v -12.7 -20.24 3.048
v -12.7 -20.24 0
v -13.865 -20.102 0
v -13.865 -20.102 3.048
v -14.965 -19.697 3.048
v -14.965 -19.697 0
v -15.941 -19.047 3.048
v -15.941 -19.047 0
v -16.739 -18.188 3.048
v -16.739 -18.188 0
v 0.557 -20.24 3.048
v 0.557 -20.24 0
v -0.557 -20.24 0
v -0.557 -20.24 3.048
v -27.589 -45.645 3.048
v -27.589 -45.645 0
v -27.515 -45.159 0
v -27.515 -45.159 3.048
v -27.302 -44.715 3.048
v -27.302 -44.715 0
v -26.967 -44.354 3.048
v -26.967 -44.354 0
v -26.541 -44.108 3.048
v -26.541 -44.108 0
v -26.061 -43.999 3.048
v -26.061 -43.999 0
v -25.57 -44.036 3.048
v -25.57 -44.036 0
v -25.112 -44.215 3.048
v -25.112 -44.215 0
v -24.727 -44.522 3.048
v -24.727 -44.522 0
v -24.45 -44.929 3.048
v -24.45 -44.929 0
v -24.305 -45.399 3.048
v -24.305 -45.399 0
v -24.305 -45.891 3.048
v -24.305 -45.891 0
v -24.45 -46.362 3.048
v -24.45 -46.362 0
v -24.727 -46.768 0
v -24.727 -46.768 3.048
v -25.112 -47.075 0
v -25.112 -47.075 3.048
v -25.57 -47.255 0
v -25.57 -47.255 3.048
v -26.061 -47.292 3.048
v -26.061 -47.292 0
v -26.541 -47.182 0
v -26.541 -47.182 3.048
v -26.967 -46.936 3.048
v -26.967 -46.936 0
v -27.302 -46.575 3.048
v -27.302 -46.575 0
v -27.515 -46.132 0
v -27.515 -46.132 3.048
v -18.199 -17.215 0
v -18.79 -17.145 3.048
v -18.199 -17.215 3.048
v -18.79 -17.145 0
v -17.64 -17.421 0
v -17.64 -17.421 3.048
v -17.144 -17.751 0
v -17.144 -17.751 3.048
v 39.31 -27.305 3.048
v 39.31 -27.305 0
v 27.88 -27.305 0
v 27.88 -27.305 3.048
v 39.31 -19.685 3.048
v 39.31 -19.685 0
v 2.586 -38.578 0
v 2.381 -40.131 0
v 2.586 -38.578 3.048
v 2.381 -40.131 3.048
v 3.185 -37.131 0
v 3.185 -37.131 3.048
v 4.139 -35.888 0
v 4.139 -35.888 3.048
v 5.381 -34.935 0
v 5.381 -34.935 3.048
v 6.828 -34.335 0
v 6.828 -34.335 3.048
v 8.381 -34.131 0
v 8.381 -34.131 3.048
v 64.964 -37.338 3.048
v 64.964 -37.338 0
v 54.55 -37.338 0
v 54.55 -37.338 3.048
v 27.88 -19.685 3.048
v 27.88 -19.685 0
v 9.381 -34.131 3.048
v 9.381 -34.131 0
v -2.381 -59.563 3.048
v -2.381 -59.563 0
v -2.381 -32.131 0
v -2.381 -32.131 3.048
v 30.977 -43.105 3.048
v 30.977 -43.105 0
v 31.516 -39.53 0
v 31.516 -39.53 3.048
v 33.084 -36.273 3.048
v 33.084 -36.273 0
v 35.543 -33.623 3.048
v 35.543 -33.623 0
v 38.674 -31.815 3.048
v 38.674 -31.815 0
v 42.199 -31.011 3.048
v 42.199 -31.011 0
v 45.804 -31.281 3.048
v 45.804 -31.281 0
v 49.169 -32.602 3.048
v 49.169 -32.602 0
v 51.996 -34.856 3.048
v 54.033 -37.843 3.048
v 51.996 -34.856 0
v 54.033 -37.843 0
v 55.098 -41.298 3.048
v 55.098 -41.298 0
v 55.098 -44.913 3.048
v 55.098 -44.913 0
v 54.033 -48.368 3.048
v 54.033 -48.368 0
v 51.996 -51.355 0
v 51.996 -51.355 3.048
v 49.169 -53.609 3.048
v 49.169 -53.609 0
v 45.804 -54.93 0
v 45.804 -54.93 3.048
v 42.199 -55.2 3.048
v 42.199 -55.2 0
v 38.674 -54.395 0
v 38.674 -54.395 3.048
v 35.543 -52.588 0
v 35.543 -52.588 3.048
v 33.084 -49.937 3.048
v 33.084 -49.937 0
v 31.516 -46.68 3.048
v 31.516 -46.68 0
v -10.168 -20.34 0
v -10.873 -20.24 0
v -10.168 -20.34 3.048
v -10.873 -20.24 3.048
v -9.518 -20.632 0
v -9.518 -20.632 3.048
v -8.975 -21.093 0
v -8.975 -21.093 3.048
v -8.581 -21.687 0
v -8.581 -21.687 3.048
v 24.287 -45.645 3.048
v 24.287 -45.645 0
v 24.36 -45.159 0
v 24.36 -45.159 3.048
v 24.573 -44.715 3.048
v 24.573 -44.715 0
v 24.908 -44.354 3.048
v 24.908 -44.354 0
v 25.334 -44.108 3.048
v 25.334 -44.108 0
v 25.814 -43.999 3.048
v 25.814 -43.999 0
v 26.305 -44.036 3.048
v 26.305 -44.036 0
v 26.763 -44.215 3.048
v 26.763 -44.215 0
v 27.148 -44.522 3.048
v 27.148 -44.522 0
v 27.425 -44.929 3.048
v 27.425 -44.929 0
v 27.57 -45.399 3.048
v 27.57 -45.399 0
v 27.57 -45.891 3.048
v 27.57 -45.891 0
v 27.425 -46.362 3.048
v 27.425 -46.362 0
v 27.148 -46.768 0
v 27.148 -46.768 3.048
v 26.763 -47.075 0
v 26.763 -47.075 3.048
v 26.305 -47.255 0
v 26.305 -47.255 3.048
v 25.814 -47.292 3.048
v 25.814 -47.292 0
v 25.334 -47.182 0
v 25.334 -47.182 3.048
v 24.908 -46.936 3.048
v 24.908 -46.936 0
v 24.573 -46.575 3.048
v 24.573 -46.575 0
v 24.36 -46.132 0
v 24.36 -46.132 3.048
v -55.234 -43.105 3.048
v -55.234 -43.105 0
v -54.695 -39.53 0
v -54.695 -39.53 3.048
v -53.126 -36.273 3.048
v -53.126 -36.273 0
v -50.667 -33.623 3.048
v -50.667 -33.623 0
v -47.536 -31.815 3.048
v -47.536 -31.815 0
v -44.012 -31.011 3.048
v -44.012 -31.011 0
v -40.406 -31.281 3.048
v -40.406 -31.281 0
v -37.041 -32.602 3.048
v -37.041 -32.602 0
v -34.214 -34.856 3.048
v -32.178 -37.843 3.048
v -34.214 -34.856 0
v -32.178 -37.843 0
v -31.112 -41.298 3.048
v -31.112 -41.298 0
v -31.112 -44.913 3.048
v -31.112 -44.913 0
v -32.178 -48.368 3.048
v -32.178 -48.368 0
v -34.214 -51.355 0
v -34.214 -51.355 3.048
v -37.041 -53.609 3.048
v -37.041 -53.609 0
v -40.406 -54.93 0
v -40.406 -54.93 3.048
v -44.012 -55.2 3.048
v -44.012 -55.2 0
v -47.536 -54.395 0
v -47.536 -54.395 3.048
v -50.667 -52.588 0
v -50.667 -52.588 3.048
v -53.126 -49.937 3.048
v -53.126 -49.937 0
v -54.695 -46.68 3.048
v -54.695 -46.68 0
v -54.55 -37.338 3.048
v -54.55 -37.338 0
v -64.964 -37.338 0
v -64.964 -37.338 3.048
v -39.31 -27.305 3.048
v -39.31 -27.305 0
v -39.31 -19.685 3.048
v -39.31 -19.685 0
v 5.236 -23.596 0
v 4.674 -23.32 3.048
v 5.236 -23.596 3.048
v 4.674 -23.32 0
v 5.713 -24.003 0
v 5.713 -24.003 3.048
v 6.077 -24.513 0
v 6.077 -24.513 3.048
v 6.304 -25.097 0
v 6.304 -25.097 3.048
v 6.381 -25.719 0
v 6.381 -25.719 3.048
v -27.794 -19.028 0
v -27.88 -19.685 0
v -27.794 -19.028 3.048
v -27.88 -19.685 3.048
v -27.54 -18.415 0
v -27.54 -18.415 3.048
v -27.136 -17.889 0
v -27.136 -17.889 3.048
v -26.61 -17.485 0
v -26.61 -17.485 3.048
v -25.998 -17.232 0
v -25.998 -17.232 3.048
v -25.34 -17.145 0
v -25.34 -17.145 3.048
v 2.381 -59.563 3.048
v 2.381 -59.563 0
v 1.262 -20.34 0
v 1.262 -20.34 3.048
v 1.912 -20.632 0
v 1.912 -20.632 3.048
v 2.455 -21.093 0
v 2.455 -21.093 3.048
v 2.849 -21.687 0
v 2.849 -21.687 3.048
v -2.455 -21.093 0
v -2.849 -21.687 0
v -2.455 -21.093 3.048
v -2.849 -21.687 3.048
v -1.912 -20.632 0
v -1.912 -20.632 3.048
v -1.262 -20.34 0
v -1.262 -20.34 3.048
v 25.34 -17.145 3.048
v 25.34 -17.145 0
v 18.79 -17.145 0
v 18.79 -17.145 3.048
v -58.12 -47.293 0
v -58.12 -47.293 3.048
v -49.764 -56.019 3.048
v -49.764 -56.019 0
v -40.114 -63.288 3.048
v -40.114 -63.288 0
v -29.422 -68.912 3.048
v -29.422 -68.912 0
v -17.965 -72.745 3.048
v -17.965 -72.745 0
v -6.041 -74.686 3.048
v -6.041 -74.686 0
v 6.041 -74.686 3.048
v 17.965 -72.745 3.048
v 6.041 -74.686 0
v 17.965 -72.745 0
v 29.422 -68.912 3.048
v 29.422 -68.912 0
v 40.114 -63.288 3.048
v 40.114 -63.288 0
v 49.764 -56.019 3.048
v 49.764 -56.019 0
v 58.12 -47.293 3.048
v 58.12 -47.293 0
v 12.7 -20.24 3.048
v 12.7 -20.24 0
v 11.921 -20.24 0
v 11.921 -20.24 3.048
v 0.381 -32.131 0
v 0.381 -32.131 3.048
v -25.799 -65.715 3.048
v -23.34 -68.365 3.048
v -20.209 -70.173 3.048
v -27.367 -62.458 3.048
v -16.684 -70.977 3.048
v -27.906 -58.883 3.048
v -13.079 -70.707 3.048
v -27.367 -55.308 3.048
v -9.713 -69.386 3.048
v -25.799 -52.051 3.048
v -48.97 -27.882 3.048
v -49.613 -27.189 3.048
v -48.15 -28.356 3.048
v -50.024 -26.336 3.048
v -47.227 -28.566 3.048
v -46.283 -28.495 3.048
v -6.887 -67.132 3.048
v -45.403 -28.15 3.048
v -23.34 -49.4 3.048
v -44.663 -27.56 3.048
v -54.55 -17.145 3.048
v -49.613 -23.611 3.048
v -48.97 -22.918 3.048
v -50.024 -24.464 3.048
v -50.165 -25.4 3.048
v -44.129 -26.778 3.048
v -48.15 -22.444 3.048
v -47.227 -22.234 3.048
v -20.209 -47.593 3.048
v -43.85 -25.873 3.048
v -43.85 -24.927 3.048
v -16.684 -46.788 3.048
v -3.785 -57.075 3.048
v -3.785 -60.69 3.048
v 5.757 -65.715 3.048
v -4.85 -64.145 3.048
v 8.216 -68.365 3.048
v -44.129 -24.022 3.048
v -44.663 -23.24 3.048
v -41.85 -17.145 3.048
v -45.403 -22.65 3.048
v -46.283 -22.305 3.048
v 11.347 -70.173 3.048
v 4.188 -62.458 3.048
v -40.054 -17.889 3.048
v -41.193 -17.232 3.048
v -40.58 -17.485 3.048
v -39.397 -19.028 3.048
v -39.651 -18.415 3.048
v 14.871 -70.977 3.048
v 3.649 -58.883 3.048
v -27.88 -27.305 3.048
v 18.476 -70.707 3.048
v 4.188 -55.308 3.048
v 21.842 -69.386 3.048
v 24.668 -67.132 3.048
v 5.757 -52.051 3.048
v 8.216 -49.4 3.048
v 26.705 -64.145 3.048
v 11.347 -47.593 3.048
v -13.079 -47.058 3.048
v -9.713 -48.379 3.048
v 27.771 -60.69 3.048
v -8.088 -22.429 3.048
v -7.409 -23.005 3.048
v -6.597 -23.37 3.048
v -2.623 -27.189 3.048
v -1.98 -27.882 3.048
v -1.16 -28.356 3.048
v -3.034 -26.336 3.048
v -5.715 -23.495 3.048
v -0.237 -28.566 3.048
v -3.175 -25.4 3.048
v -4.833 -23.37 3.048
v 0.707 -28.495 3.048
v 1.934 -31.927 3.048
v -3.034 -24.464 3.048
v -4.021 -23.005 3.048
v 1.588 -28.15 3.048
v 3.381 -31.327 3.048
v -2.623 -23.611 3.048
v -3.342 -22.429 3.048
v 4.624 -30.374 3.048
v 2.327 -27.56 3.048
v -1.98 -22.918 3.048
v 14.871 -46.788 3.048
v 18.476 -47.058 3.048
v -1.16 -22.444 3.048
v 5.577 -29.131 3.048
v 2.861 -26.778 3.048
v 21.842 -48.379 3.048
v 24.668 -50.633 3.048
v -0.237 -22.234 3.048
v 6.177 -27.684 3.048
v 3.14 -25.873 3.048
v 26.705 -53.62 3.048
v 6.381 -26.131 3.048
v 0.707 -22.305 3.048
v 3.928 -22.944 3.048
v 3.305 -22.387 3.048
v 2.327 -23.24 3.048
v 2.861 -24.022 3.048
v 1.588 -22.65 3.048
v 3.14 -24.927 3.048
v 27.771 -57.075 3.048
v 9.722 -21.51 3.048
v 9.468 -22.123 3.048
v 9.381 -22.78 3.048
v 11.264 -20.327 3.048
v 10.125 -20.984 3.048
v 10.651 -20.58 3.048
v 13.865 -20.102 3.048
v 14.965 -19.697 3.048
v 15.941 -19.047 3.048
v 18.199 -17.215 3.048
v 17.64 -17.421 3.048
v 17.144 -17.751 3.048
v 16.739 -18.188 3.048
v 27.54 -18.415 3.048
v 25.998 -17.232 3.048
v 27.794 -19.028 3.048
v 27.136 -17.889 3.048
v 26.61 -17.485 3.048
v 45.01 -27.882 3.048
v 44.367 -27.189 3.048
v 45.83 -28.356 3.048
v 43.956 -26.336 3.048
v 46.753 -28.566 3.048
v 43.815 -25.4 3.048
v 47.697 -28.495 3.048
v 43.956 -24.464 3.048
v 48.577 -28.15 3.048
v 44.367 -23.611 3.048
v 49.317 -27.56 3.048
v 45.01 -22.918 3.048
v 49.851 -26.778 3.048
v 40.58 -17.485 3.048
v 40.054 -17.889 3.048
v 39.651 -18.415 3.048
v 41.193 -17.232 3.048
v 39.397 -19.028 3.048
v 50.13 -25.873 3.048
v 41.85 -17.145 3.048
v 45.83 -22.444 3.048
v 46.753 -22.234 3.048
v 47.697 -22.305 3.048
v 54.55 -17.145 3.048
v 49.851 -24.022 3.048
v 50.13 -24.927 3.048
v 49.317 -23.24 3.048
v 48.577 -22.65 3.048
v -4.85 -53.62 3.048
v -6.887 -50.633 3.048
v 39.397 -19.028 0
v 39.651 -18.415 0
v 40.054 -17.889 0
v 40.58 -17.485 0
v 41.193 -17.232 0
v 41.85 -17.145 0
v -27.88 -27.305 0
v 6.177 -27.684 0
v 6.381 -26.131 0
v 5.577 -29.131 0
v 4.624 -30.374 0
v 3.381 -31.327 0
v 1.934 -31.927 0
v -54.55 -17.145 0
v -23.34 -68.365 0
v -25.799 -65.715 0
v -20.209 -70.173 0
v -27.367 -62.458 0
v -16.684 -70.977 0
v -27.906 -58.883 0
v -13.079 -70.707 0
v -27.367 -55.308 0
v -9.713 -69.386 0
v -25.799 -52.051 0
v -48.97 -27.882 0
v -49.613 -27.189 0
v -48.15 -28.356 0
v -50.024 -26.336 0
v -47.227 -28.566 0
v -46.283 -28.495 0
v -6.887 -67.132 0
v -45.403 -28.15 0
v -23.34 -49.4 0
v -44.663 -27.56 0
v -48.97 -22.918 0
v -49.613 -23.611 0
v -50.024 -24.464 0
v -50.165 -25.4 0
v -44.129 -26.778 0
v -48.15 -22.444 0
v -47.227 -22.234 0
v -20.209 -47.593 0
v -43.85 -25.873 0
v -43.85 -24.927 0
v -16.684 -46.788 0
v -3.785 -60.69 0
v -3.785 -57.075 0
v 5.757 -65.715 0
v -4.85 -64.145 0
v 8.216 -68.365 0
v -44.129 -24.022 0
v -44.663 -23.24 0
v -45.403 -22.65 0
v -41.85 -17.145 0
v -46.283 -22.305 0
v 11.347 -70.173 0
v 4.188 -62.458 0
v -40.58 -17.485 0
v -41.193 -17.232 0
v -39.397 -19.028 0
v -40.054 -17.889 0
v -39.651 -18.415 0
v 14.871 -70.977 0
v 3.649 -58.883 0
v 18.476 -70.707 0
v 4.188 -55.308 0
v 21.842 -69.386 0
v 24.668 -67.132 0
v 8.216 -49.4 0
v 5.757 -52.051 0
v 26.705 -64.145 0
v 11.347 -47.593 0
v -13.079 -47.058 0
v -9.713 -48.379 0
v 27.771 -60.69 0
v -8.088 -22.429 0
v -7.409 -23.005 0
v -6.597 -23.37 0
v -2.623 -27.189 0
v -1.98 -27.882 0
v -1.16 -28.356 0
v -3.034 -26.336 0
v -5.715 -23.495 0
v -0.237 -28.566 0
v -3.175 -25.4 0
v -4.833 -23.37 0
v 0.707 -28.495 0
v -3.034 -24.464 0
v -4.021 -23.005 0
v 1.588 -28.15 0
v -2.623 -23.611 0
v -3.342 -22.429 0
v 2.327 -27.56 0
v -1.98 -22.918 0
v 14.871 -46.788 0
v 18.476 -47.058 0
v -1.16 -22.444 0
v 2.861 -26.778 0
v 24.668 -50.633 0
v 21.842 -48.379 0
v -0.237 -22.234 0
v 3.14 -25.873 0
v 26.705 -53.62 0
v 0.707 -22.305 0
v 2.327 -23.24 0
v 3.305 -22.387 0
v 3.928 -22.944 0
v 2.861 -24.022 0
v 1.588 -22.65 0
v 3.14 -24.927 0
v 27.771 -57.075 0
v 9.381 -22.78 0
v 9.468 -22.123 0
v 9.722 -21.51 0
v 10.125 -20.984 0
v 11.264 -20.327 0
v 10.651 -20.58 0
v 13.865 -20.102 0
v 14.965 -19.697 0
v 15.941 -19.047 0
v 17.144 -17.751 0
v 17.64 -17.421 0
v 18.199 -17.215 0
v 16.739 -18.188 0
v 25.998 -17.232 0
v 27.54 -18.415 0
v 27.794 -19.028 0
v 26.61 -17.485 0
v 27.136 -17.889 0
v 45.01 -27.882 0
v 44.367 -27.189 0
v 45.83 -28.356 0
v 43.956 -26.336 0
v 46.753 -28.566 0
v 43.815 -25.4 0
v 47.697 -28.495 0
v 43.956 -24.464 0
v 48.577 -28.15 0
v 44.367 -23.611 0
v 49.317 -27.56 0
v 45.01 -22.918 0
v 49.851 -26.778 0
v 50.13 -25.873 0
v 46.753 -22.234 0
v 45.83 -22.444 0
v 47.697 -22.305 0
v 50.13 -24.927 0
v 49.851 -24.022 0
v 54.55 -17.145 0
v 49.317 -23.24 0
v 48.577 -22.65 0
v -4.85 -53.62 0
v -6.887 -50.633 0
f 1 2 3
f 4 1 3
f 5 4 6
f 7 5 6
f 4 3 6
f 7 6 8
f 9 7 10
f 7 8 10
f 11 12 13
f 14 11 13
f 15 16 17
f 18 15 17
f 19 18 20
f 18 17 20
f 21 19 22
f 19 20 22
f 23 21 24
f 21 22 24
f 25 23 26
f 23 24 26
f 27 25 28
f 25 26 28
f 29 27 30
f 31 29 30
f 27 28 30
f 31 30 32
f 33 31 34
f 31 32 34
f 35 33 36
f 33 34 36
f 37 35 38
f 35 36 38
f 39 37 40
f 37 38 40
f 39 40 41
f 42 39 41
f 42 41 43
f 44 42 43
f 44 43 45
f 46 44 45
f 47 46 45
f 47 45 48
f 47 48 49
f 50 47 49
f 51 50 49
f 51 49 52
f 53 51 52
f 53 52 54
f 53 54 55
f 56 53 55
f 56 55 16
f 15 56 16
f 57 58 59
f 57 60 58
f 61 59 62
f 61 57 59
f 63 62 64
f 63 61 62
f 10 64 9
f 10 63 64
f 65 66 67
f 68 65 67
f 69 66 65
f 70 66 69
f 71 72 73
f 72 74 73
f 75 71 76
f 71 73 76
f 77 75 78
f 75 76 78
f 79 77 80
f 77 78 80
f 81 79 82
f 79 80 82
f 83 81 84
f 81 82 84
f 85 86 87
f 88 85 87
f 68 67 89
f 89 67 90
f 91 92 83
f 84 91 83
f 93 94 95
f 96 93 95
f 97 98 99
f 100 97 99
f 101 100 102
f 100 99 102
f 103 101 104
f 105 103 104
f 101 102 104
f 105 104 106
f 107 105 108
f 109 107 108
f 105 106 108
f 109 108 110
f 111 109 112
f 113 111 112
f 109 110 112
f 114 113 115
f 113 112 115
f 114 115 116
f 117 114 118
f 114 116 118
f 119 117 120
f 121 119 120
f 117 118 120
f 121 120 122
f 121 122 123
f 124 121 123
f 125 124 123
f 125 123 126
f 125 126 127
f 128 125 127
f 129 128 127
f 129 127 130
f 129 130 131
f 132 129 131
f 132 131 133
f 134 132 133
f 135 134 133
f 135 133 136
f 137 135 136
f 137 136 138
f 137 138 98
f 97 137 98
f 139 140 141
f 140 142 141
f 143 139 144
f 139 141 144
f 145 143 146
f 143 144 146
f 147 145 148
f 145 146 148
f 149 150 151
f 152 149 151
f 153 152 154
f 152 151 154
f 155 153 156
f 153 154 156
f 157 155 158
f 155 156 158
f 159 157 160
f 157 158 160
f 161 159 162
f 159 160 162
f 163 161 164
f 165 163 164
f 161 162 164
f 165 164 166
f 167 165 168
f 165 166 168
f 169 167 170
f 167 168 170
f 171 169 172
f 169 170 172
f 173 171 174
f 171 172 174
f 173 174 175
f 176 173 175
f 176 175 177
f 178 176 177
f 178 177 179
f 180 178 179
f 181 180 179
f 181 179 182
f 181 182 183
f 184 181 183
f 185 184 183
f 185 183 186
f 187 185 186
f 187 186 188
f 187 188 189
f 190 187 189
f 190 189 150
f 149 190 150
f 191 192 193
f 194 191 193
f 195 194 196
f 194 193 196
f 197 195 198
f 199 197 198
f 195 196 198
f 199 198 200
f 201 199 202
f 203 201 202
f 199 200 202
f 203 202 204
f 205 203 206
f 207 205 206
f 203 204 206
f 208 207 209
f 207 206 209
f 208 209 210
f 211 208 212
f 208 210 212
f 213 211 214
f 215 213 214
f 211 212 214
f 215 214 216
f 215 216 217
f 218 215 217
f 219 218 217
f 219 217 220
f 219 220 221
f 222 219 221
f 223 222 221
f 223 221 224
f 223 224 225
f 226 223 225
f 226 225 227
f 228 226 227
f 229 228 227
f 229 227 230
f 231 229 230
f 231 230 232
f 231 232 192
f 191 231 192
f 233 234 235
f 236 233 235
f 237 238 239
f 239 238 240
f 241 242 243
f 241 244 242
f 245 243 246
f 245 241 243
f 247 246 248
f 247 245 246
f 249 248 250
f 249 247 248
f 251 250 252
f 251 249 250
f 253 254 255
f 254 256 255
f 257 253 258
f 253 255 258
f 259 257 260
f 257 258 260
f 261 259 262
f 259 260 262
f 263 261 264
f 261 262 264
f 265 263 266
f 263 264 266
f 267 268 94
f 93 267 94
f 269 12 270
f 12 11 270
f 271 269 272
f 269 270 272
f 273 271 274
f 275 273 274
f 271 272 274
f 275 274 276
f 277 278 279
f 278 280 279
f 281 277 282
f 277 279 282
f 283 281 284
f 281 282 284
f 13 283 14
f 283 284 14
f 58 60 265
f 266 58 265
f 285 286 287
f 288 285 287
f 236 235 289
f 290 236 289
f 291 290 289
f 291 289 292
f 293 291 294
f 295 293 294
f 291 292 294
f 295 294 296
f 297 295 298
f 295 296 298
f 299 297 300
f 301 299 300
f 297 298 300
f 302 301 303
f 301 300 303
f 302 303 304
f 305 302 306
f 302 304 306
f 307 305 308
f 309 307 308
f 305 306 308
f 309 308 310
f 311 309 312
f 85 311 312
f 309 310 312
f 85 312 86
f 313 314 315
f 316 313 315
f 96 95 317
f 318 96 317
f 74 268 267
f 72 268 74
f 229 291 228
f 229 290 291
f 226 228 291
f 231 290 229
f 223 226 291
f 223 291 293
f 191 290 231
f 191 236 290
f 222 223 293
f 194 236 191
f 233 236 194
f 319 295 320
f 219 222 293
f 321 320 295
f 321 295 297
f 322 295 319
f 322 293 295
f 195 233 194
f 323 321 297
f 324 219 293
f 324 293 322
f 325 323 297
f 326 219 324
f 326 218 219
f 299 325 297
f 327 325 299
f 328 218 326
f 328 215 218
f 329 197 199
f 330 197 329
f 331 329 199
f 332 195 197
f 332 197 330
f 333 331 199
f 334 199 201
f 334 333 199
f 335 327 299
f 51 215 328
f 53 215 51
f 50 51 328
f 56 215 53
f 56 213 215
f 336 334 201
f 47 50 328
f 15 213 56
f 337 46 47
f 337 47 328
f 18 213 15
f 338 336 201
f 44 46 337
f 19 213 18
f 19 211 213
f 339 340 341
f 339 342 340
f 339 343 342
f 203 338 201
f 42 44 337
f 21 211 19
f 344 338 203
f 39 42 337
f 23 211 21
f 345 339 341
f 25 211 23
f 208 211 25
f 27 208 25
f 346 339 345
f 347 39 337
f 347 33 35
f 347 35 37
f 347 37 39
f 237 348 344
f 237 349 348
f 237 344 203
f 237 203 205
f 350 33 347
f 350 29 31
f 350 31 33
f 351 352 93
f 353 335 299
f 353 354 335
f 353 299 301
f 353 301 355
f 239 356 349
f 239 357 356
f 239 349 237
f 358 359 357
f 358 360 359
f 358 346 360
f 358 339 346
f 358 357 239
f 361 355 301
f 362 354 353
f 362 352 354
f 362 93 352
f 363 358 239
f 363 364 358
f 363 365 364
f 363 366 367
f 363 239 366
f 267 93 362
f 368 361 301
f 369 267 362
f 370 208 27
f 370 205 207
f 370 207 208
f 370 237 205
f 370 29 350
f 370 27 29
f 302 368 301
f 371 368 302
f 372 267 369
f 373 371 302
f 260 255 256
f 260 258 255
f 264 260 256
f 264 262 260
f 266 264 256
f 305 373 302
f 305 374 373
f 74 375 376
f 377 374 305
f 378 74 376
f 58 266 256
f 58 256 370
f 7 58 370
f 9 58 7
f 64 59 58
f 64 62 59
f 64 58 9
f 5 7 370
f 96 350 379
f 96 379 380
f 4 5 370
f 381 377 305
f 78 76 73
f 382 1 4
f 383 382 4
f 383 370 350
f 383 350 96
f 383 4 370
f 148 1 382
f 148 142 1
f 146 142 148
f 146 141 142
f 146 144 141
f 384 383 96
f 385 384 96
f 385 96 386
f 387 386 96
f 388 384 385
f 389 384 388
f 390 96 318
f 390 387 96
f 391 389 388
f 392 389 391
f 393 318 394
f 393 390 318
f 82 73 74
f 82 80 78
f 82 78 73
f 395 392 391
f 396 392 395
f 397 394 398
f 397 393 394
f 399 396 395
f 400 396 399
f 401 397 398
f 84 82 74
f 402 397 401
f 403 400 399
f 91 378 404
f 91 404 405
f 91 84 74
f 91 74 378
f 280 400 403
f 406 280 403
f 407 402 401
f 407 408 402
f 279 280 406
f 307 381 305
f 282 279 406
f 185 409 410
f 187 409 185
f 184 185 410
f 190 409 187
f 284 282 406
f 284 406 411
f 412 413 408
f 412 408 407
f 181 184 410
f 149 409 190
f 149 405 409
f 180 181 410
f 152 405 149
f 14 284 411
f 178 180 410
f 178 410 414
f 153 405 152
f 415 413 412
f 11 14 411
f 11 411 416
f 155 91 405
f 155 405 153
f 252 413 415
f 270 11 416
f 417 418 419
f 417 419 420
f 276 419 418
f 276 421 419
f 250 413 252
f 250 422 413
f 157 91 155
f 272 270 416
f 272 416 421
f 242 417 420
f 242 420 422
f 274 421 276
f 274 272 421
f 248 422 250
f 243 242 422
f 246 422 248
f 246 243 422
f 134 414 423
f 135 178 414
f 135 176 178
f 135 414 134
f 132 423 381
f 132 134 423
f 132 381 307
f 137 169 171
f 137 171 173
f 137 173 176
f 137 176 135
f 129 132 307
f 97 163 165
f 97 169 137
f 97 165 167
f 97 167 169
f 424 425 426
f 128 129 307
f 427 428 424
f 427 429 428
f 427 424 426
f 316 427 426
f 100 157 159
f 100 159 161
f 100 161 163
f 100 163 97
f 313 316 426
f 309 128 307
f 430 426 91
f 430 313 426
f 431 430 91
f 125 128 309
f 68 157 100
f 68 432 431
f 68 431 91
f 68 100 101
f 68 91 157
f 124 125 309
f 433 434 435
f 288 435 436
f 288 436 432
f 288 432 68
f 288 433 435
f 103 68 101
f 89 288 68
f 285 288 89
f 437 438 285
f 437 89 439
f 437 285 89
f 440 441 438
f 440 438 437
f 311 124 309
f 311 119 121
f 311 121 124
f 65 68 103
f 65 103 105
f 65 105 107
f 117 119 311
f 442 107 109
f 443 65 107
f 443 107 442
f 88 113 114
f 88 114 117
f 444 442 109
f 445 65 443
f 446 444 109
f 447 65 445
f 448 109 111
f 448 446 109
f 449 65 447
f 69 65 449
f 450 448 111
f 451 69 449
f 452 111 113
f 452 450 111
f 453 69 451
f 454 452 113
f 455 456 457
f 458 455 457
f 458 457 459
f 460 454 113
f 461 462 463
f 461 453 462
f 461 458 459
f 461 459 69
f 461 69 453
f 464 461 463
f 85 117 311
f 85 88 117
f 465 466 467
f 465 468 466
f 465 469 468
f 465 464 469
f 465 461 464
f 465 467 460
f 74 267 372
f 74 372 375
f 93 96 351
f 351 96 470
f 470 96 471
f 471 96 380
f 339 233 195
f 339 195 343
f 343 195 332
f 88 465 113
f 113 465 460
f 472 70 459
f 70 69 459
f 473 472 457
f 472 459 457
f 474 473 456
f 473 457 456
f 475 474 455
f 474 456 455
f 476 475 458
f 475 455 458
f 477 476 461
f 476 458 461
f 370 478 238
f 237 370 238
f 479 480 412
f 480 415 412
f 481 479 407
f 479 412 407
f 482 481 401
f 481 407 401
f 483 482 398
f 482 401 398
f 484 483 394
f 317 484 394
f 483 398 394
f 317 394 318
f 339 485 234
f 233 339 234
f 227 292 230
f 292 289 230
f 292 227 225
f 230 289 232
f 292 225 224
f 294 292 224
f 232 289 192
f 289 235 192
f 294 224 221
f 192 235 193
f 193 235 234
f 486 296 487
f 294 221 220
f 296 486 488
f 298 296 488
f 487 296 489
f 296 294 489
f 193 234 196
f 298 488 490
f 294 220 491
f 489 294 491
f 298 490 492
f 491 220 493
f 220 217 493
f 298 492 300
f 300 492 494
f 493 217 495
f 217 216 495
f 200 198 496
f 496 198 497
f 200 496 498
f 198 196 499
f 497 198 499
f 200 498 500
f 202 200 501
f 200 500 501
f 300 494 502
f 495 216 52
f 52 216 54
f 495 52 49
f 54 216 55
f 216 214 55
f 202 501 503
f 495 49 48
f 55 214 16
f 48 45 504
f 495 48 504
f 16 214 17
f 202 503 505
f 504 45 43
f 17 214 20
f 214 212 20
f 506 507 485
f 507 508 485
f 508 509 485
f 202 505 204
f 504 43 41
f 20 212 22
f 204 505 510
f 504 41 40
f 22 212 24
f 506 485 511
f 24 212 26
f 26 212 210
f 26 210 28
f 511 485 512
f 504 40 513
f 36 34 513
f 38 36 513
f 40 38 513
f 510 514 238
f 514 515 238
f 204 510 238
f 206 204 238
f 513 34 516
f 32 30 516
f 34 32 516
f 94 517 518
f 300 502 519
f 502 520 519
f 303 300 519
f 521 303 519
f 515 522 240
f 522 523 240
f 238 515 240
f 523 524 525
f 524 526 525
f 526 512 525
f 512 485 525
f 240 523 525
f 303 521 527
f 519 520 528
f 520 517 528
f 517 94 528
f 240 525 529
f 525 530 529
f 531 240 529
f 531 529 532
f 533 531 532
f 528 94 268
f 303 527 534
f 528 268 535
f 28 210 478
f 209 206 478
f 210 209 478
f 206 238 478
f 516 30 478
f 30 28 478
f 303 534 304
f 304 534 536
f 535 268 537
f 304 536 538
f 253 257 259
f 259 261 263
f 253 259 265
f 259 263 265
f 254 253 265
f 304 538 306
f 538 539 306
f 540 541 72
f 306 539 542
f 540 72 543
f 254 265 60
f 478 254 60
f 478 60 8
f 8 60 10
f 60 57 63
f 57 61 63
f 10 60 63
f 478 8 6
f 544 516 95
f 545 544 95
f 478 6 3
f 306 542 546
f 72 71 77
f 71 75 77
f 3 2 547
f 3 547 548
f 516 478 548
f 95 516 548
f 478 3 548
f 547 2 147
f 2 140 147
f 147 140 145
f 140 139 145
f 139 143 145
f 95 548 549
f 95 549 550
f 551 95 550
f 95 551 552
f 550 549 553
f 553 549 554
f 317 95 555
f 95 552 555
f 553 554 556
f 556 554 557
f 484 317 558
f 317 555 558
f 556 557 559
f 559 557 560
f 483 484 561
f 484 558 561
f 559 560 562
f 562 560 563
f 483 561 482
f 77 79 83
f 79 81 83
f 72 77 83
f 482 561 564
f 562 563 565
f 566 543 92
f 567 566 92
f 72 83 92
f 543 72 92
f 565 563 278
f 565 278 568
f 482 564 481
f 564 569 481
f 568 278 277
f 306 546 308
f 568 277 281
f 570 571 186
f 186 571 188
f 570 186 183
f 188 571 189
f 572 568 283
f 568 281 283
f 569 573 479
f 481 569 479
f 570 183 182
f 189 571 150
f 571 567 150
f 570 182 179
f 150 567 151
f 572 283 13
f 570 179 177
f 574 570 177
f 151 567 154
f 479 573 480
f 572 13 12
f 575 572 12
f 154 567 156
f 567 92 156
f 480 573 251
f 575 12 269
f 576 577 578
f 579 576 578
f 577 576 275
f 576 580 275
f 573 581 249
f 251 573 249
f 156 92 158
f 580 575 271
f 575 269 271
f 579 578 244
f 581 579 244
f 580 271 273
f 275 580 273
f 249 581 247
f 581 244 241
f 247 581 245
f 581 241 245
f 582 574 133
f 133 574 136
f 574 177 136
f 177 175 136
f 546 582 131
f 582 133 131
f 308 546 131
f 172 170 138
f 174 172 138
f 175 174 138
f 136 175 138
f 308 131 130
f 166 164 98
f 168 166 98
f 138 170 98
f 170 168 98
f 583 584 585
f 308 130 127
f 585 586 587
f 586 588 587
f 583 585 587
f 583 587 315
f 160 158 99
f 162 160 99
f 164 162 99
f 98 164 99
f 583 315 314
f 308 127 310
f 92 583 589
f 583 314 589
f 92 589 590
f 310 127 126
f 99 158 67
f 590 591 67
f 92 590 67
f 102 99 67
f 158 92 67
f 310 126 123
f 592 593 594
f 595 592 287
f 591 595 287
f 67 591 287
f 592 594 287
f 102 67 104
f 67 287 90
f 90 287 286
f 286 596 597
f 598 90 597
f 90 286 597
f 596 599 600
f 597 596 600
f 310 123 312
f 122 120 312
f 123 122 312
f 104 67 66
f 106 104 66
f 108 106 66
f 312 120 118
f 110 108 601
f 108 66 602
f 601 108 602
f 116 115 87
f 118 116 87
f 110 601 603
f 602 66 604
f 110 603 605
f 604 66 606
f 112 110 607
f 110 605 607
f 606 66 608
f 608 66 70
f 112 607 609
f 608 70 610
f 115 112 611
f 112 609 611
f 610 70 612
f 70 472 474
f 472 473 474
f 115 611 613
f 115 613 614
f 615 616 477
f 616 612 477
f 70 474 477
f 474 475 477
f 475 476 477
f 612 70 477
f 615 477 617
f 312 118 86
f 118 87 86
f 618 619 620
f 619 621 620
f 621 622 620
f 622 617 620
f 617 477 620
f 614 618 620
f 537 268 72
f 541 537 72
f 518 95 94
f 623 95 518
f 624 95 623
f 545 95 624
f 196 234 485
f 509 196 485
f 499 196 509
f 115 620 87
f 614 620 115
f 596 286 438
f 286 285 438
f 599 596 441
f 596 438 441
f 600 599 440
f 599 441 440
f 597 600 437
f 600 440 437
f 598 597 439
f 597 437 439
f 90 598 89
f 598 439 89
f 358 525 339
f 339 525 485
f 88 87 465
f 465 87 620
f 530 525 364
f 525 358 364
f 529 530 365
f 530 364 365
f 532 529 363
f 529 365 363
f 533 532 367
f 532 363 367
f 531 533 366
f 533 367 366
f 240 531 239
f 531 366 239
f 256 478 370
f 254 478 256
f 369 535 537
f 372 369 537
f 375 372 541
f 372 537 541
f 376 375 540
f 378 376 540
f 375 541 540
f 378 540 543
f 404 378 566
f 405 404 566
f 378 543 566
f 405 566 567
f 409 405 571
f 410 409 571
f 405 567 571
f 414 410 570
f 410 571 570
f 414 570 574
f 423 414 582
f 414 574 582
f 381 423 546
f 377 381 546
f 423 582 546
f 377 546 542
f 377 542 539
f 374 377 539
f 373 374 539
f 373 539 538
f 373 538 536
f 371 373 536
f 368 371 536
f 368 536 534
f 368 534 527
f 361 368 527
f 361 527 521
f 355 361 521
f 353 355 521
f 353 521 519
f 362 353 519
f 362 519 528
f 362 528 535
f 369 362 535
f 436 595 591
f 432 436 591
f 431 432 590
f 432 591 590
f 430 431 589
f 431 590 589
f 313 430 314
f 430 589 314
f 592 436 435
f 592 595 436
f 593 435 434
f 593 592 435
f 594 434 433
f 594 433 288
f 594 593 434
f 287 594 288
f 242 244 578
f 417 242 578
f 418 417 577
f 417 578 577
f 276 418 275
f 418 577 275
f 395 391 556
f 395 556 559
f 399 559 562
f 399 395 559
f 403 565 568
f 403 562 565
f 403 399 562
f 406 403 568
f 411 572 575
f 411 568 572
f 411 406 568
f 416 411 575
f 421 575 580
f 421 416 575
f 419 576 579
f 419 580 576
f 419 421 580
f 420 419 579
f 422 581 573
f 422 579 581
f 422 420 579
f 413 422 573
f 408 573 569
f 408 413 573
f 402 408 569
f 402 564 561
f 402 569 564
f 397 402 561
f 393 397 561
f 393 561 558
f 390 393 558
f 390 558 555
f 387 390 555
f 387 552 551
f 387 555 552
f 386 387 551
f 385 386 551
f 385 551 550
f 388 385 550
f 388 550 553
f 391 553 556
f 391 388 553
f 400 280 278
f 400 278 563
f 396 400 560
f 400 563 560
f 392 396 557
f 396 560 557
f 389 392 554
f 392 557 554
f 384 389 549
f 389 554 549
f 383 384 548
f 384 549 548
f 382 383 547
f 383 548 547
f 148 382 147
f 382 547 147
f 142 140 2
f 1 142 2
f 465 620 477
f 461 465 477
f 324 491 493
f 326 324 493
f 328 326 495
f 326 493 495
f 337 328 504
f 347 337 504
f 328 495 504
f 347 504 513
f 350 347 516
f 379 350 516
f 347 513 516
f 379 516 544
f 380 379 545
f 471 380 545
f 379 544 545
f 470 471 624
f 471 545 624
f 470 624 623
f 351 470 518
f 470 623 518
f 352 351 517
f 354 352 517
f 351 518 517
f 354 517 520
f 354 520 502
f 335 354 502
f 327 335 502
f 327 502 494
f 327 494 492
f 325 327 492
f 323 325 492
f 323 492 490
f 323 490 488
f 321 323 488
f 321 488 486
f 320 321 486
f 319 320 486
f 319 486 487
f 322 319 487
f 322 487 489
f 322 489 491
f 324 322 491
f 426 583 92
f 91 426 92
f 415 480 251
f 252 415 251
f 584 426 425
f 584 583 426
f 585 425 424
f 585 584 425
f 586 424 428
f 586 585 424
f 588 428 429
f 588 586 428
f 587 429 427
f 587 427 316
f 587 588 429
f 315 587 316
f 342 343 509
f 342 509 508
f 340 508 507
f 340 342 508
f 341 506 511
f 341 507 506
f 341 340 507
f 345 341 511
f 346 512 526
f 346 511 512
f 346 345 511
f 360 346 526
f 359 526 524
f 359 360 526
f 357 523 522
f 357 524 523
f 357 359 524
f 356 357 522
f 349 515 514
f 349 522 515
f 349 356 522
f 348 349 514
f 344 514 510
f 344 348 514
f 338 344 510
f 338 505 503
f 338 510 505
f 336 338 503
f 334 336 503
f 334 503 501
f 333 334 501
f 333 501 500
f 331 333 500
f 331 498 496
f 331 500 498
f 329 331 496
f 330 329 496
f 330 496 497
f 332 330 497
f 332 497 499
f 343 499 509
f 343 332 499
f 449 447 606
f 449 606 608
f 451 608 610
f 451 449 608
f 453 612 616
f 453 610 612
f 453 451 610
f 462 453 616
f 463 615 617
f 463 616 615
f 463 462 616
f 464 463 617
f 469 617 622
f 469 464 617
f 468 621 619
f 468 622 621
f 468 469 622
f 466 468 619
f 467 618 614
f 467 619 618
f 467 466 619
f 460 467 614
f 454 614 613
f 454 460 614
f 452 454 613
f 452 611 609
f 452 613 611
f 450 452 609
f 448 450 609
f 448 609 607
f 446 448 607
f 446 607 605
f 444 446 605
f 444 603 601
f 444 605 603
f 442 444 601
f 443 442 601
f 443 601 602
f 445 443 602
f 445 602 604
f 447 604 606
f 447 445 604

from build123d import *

# Parameters (mm, degrees)
SKETCH1_R                 = 1.651
BOSS_EXTRUDE2_DEPTH       = 3.048
SKETCH2_R                 = 1.143
CUT_EXTRUDE1_DEPTH        = 4.048
SKETCH3_R                 = 12.1285
CUT_EXTRUDE2_DEPTH        = 4.048
SKETCH4_W                 = 28.562713242
SKETCH4_H                 = 11.677503754
BOSS_EXTRUDE3_DEPTH       = 3.048
SKETCH5_W                 = 216.7214489
SKETCH5_H                 = 130.569220634
CUT_EXTRUDE4_DEPTH        = 4.048
SKETCH6_W                 = 4.7625
SKETCH6_H                 = 27.432
CUT_EXTRUDE5_DEPTH        = 4.048
SKETCH10_W                = 11.43
SKETCH10_H                = 10.16
CUT_EXTRUDE9_DEPTH        = 4.048
FILLET1_R                 = 6
FILLET2_R                 = 6
SKETCH66_R                = 1.651
CUT_EXTRUDE65_DEPTH       = 97.79
SKETCH120_R               = 3.175
CUT_EXTRUDE119_DEPTH      = 103.378
CUT_EXTRUDE119_DEPTH_BACK = 48.768
CUT_EXTRUDE12_DEPTH       = 10
FILLET3_R                 = 2.54


with BuildPart() as part:
    # Sketch1 → Boss-Extrude2 (new body)
    with BuildSketch(Plane.XY):
        with BuildLine():
            Line((-64.964441474, 37.338), (-54.550441474, 37.338))
            Line((-54.550441474, 37.338), (-54.550441474, -37.338))
            Line((-54.550441474, -37.338), (-64.964441474, -37.338))
            ThreePointArc((-64.964441474, -37.338), (0, -74.93), (64.964441474, -37.338))
            Line((64.964441474, -37.338), (54.550441474, -37.338))
            Line((54.550441474, -37.338), (54.550441474, 37.338))
            Line((54.550441474, 37.338), (64.964441474, 37.338))
            ThreePointArc((64.964441474, 37.338), (0, 74.93), (-64.964441474, 37.338))
        make_face()
        with Locations((-46.482, 11.049)):
            Circle(SKETCH1_R, mode=Mode.SUBTRACT)
        with Locations((-21.083270032, 10.795)):
            Circle(SKETCH1_R, mode=Mode.SUBTRACT)
        with Locations((-21.083270032, -10.795)):
            Circle(SKETCH1_R, mode=Mode.SUBTRACT)
        with Locations((-46.482, -11.049)):
            Circle(SKETCH1_R, mode=Mode.SUBTRACT)
        with Locations((46.482, -11.049)):
            Circle(SKETCH1_R, mode=Mode.SUBTRACT)
        with Locations((21.083270032, -10.795)):
            Circle(SKETCH1_R, mode=Mode.SUBTRACT)
        with Locations((21.083270032, 10.795)):
            Circle(SKETCH1_R, mode=Mode.SUBTRACT)
        with Locations((46.482, 11.049)):
            Circle(SKETCH1_R, mode=Mode.SUBTRACT)
    extrude(amount=BOSS_EXTRUDE2_DEPTH)

    # Sketch2 → Cut-Extrude1 (cut, through all)
    with BuildSketch(Plane.XY.offset(3.048)):
        with Locations((-6.731, 62.23)):
            Circle(SKETCH2_R)
        with Locations((6.731, 62.23)):
            Circle(SKETCH2_R)
    extrude(amount=-CUT_EXTRUDE1_DEPTH, mode=Mode.SUBTRACT)

    # Sketch3 → Cut-Extrude2 (cut, through all)
    with BuildSketch(Plane(origin=(0, 0, 0), x_dir=(-1, 0, 0), z_dir=(0, 0, -1))):
        with Locations((-15.777608989, -58.882838371)):
            Circle(SKETCH3_R)
        with Locations((15.777608989, -58.882838371)):
            Circle(SKETCH3_R)
        with Locations((-43.105229381, -43.105229381)):
            Circle(SKETCH3_R)
        with Locations((19.05, 32.995567884)):
            Circle(SKETCH3_R)
        with Locations((-43.105229381, 43.105229381)):
            Circle(SKETCH3_R)
        with Locations((43.105229381, 43.105229381)):
            Circle(SKETCH3_R)
        with Locations((-19.05, 32.995567884)):
            Circle(SKETCH3_R)
        with Locations((43.105229381, -43.105229381)):
            Circle(SKETCH3_R)
    extrude(amount=-CUT_EXTRUDE2_DEPTH, mode=Mode.SUBTRACT)

    # Sketch4 → Boss-Extrude3 (add)
    with BuildSketch(Plane(origin=(0, 0, 0), x_dir=(-1, 0, 0), z_dir=(0, 0, -1))):
        with Locations((-1.488809975, 62.152540216)):
            Rectangle(SKETCH4_W, SKETCH4_H)
    extrude(amount=-BOSS_EXTRUDE3_DEPTH)

    # Sketch5 → Cut-Extrude4 (cut, through all)
    with BuildSketch(Plane(origin=(0, 0, 0), x_dir=(-1, 0, 0), z_dir=(0, 0, -1))):
        with Locations((23.316688373, 48.139610317)):
            Rectangle(SKETCH5_W, SKETCH5_H)
    extrude(amount=-CUT_EXTRUDE4_DEPTH, mode=Mode.SUBTRACT)

    # Sketch6 → Cut-Extrude5 (cut, through all)
    with BuildSketch(Plane(origin=(0, 0, 0), x_dir=(-1, 0, 0), z_dir=(0, 0, -1))):
        with Locations((0, -45.847)):
            Rectangle(SKETCH6_W, SKETCH6_H)
        Polygon((-2.38125, -34.131), (-2.38125, -32.131), (-6.38125, -32.131), (-6.38125, -17.145), (-9.38125, -17.145), (-9.38125, -34.131), align=None)
    extrude(amount=-CUT_EXTRUDE5_DEPTH, mode=Mode.SUBTRACT)

    # Sketch10 → Cut-Extrude9 (cut, through all)
    with BuildSketch(Plane(origin=(0, 0, 0), x_dir=(-1, 0, 0), z_dir=(0, 0, -1))):
        with Locations((-33.595441474, -22.225)):
            Rectangle(SKETCH10_W, SKETCH10_H)
        with Locations((33.595441474, -22.225)):
            Rectangle(SKETCH10_W, SKETCH10_H)
    extrude(amount=-CUT_EXTRUDE9_DEPTH, mode=Mode.SUBTRACT)

    # Fillet1
    fillet1_edges = [part.edges().sort_by_distance(p)[0] for p in [
        (6.38125, -32.131, 1.524),
    ]]
    fillet(fillet1_edges, radius=FILLET1_R)

    # Fillet2
    fillet2_edges = [part.edges().sort_by_distance(p)[0] for p in [
        (2.38125, -34.131, 1.524),
    ]]
    fillet(fillet2_edges, radius=FILLET2_R)

    # Sketch66 → Cut-Extrude65 (cut)
    with BuildSketch(Plane(origin=(30.092005081, 4.08352975, -16.1925), x_dir=(-1, 0, 0), z_dir=(0, 0, -1))):
        with Locations((4.154396091, -49.728759131)):
            Circle(SKETCH66_R)
        with Locations((56.02961407, -49.728759131)):
            Circle(SKETCH66_R)
    extrude(amount=-CUT_EXTRUDE65_DEPTH, mode=Mode.SUBTRACT)

    # Sketch120 → Cut-Extrude119 (cut, two sides)
    with BuildSketch(Plane(origin=(30.092005081, 4.08352975, 19.939), x_dir=(-1, 0, 0), z_dir=(0, 0, -1))) as cut_extrude119_sk:
        with Locations((77.082005081, -29.48352975)):
            Circle(SKETCH120_R)
        with Locations((30.092005081, -29.48352975)):
            Circle(SKETCH120_R)
        with Locations((-16.897994919, -29.48352975)):
            Circle(SKETCH120_R)
    extrude(amount=CUT_EXTRUDE119_DEPTH, mode=Mode.SUBTRACT)
    extrude(cut_extrude119_sk.sketch, amount=-CUT_EXTRUDE119_DEPTH_BACK, mode=Mode.SUBTRACT)

    # Sketch13 → Cut-Extrude12 (cut)
    with BuildSketch(Plane(origin=(0, 0, 0), x_dir=(-1, 0, 0), z_dir=(0, 0, -1))):
        with BuildLine():
            Line((-12.7, -20.24), (-8.888991966, -20.24))
            ThreePointArc((-8.888991966, -20.24), (-5.715, -23.495), (-2.541008034, -20.24))
            Line((-2.541008034, -20.24), (2.541008034, -20.24))
            ThreePointArc((2.541008034, -20.24), (5.715, -23.495), (8.888991966, -20.24))
            Line((8.888991966, -20.24), (12.7, -20.24))
            ThreePointArc((12.7, -20.24), (16.235533906, -11.704466094), (7.7, -15.24))
            Line((7.7, -15.24), (-1.0625, -15.24))
            ThreePointArc((-1.0625, -15.24), (-4.012347567, -10.679640913), (-9.38125, -11.500227489))
            ThreePointArc((-9.38125, -11.500227489), (-17.374337523, -13.465015853), (-12.7, -20.24))
        make_face()
    extrude(amount=-CUT_EXTRUDE12_DEPTH, mode=Mode.SUBTRACT)

    # Fillet3
    fillet3_edges = [part.edges().sort_by_distance(p)[0] for p in [
        (39.310441474, -17.145, 1.524),
        (27.880441474, -17.145, 1.524),
        (-27.880441474, -17.145, 1.524),
        (-39.310441474, -17.145, 1.524),
        (6.38125, -23.424309253, 1.524),
        (9.38125, -20.24, 1.524),
        (17.322875188, -17.145, 1.524),
        (-17.322875188, -17.145, 1.524),
        (-8.888991966, -20.24, 1.524),
        (-2.541008034, -20.24, 1.524),
        (2.541008034, -20.24, 1.524),
    ]]
    fillet(fillet3_edges, radius=FILLET3_R)


solid = part.part
